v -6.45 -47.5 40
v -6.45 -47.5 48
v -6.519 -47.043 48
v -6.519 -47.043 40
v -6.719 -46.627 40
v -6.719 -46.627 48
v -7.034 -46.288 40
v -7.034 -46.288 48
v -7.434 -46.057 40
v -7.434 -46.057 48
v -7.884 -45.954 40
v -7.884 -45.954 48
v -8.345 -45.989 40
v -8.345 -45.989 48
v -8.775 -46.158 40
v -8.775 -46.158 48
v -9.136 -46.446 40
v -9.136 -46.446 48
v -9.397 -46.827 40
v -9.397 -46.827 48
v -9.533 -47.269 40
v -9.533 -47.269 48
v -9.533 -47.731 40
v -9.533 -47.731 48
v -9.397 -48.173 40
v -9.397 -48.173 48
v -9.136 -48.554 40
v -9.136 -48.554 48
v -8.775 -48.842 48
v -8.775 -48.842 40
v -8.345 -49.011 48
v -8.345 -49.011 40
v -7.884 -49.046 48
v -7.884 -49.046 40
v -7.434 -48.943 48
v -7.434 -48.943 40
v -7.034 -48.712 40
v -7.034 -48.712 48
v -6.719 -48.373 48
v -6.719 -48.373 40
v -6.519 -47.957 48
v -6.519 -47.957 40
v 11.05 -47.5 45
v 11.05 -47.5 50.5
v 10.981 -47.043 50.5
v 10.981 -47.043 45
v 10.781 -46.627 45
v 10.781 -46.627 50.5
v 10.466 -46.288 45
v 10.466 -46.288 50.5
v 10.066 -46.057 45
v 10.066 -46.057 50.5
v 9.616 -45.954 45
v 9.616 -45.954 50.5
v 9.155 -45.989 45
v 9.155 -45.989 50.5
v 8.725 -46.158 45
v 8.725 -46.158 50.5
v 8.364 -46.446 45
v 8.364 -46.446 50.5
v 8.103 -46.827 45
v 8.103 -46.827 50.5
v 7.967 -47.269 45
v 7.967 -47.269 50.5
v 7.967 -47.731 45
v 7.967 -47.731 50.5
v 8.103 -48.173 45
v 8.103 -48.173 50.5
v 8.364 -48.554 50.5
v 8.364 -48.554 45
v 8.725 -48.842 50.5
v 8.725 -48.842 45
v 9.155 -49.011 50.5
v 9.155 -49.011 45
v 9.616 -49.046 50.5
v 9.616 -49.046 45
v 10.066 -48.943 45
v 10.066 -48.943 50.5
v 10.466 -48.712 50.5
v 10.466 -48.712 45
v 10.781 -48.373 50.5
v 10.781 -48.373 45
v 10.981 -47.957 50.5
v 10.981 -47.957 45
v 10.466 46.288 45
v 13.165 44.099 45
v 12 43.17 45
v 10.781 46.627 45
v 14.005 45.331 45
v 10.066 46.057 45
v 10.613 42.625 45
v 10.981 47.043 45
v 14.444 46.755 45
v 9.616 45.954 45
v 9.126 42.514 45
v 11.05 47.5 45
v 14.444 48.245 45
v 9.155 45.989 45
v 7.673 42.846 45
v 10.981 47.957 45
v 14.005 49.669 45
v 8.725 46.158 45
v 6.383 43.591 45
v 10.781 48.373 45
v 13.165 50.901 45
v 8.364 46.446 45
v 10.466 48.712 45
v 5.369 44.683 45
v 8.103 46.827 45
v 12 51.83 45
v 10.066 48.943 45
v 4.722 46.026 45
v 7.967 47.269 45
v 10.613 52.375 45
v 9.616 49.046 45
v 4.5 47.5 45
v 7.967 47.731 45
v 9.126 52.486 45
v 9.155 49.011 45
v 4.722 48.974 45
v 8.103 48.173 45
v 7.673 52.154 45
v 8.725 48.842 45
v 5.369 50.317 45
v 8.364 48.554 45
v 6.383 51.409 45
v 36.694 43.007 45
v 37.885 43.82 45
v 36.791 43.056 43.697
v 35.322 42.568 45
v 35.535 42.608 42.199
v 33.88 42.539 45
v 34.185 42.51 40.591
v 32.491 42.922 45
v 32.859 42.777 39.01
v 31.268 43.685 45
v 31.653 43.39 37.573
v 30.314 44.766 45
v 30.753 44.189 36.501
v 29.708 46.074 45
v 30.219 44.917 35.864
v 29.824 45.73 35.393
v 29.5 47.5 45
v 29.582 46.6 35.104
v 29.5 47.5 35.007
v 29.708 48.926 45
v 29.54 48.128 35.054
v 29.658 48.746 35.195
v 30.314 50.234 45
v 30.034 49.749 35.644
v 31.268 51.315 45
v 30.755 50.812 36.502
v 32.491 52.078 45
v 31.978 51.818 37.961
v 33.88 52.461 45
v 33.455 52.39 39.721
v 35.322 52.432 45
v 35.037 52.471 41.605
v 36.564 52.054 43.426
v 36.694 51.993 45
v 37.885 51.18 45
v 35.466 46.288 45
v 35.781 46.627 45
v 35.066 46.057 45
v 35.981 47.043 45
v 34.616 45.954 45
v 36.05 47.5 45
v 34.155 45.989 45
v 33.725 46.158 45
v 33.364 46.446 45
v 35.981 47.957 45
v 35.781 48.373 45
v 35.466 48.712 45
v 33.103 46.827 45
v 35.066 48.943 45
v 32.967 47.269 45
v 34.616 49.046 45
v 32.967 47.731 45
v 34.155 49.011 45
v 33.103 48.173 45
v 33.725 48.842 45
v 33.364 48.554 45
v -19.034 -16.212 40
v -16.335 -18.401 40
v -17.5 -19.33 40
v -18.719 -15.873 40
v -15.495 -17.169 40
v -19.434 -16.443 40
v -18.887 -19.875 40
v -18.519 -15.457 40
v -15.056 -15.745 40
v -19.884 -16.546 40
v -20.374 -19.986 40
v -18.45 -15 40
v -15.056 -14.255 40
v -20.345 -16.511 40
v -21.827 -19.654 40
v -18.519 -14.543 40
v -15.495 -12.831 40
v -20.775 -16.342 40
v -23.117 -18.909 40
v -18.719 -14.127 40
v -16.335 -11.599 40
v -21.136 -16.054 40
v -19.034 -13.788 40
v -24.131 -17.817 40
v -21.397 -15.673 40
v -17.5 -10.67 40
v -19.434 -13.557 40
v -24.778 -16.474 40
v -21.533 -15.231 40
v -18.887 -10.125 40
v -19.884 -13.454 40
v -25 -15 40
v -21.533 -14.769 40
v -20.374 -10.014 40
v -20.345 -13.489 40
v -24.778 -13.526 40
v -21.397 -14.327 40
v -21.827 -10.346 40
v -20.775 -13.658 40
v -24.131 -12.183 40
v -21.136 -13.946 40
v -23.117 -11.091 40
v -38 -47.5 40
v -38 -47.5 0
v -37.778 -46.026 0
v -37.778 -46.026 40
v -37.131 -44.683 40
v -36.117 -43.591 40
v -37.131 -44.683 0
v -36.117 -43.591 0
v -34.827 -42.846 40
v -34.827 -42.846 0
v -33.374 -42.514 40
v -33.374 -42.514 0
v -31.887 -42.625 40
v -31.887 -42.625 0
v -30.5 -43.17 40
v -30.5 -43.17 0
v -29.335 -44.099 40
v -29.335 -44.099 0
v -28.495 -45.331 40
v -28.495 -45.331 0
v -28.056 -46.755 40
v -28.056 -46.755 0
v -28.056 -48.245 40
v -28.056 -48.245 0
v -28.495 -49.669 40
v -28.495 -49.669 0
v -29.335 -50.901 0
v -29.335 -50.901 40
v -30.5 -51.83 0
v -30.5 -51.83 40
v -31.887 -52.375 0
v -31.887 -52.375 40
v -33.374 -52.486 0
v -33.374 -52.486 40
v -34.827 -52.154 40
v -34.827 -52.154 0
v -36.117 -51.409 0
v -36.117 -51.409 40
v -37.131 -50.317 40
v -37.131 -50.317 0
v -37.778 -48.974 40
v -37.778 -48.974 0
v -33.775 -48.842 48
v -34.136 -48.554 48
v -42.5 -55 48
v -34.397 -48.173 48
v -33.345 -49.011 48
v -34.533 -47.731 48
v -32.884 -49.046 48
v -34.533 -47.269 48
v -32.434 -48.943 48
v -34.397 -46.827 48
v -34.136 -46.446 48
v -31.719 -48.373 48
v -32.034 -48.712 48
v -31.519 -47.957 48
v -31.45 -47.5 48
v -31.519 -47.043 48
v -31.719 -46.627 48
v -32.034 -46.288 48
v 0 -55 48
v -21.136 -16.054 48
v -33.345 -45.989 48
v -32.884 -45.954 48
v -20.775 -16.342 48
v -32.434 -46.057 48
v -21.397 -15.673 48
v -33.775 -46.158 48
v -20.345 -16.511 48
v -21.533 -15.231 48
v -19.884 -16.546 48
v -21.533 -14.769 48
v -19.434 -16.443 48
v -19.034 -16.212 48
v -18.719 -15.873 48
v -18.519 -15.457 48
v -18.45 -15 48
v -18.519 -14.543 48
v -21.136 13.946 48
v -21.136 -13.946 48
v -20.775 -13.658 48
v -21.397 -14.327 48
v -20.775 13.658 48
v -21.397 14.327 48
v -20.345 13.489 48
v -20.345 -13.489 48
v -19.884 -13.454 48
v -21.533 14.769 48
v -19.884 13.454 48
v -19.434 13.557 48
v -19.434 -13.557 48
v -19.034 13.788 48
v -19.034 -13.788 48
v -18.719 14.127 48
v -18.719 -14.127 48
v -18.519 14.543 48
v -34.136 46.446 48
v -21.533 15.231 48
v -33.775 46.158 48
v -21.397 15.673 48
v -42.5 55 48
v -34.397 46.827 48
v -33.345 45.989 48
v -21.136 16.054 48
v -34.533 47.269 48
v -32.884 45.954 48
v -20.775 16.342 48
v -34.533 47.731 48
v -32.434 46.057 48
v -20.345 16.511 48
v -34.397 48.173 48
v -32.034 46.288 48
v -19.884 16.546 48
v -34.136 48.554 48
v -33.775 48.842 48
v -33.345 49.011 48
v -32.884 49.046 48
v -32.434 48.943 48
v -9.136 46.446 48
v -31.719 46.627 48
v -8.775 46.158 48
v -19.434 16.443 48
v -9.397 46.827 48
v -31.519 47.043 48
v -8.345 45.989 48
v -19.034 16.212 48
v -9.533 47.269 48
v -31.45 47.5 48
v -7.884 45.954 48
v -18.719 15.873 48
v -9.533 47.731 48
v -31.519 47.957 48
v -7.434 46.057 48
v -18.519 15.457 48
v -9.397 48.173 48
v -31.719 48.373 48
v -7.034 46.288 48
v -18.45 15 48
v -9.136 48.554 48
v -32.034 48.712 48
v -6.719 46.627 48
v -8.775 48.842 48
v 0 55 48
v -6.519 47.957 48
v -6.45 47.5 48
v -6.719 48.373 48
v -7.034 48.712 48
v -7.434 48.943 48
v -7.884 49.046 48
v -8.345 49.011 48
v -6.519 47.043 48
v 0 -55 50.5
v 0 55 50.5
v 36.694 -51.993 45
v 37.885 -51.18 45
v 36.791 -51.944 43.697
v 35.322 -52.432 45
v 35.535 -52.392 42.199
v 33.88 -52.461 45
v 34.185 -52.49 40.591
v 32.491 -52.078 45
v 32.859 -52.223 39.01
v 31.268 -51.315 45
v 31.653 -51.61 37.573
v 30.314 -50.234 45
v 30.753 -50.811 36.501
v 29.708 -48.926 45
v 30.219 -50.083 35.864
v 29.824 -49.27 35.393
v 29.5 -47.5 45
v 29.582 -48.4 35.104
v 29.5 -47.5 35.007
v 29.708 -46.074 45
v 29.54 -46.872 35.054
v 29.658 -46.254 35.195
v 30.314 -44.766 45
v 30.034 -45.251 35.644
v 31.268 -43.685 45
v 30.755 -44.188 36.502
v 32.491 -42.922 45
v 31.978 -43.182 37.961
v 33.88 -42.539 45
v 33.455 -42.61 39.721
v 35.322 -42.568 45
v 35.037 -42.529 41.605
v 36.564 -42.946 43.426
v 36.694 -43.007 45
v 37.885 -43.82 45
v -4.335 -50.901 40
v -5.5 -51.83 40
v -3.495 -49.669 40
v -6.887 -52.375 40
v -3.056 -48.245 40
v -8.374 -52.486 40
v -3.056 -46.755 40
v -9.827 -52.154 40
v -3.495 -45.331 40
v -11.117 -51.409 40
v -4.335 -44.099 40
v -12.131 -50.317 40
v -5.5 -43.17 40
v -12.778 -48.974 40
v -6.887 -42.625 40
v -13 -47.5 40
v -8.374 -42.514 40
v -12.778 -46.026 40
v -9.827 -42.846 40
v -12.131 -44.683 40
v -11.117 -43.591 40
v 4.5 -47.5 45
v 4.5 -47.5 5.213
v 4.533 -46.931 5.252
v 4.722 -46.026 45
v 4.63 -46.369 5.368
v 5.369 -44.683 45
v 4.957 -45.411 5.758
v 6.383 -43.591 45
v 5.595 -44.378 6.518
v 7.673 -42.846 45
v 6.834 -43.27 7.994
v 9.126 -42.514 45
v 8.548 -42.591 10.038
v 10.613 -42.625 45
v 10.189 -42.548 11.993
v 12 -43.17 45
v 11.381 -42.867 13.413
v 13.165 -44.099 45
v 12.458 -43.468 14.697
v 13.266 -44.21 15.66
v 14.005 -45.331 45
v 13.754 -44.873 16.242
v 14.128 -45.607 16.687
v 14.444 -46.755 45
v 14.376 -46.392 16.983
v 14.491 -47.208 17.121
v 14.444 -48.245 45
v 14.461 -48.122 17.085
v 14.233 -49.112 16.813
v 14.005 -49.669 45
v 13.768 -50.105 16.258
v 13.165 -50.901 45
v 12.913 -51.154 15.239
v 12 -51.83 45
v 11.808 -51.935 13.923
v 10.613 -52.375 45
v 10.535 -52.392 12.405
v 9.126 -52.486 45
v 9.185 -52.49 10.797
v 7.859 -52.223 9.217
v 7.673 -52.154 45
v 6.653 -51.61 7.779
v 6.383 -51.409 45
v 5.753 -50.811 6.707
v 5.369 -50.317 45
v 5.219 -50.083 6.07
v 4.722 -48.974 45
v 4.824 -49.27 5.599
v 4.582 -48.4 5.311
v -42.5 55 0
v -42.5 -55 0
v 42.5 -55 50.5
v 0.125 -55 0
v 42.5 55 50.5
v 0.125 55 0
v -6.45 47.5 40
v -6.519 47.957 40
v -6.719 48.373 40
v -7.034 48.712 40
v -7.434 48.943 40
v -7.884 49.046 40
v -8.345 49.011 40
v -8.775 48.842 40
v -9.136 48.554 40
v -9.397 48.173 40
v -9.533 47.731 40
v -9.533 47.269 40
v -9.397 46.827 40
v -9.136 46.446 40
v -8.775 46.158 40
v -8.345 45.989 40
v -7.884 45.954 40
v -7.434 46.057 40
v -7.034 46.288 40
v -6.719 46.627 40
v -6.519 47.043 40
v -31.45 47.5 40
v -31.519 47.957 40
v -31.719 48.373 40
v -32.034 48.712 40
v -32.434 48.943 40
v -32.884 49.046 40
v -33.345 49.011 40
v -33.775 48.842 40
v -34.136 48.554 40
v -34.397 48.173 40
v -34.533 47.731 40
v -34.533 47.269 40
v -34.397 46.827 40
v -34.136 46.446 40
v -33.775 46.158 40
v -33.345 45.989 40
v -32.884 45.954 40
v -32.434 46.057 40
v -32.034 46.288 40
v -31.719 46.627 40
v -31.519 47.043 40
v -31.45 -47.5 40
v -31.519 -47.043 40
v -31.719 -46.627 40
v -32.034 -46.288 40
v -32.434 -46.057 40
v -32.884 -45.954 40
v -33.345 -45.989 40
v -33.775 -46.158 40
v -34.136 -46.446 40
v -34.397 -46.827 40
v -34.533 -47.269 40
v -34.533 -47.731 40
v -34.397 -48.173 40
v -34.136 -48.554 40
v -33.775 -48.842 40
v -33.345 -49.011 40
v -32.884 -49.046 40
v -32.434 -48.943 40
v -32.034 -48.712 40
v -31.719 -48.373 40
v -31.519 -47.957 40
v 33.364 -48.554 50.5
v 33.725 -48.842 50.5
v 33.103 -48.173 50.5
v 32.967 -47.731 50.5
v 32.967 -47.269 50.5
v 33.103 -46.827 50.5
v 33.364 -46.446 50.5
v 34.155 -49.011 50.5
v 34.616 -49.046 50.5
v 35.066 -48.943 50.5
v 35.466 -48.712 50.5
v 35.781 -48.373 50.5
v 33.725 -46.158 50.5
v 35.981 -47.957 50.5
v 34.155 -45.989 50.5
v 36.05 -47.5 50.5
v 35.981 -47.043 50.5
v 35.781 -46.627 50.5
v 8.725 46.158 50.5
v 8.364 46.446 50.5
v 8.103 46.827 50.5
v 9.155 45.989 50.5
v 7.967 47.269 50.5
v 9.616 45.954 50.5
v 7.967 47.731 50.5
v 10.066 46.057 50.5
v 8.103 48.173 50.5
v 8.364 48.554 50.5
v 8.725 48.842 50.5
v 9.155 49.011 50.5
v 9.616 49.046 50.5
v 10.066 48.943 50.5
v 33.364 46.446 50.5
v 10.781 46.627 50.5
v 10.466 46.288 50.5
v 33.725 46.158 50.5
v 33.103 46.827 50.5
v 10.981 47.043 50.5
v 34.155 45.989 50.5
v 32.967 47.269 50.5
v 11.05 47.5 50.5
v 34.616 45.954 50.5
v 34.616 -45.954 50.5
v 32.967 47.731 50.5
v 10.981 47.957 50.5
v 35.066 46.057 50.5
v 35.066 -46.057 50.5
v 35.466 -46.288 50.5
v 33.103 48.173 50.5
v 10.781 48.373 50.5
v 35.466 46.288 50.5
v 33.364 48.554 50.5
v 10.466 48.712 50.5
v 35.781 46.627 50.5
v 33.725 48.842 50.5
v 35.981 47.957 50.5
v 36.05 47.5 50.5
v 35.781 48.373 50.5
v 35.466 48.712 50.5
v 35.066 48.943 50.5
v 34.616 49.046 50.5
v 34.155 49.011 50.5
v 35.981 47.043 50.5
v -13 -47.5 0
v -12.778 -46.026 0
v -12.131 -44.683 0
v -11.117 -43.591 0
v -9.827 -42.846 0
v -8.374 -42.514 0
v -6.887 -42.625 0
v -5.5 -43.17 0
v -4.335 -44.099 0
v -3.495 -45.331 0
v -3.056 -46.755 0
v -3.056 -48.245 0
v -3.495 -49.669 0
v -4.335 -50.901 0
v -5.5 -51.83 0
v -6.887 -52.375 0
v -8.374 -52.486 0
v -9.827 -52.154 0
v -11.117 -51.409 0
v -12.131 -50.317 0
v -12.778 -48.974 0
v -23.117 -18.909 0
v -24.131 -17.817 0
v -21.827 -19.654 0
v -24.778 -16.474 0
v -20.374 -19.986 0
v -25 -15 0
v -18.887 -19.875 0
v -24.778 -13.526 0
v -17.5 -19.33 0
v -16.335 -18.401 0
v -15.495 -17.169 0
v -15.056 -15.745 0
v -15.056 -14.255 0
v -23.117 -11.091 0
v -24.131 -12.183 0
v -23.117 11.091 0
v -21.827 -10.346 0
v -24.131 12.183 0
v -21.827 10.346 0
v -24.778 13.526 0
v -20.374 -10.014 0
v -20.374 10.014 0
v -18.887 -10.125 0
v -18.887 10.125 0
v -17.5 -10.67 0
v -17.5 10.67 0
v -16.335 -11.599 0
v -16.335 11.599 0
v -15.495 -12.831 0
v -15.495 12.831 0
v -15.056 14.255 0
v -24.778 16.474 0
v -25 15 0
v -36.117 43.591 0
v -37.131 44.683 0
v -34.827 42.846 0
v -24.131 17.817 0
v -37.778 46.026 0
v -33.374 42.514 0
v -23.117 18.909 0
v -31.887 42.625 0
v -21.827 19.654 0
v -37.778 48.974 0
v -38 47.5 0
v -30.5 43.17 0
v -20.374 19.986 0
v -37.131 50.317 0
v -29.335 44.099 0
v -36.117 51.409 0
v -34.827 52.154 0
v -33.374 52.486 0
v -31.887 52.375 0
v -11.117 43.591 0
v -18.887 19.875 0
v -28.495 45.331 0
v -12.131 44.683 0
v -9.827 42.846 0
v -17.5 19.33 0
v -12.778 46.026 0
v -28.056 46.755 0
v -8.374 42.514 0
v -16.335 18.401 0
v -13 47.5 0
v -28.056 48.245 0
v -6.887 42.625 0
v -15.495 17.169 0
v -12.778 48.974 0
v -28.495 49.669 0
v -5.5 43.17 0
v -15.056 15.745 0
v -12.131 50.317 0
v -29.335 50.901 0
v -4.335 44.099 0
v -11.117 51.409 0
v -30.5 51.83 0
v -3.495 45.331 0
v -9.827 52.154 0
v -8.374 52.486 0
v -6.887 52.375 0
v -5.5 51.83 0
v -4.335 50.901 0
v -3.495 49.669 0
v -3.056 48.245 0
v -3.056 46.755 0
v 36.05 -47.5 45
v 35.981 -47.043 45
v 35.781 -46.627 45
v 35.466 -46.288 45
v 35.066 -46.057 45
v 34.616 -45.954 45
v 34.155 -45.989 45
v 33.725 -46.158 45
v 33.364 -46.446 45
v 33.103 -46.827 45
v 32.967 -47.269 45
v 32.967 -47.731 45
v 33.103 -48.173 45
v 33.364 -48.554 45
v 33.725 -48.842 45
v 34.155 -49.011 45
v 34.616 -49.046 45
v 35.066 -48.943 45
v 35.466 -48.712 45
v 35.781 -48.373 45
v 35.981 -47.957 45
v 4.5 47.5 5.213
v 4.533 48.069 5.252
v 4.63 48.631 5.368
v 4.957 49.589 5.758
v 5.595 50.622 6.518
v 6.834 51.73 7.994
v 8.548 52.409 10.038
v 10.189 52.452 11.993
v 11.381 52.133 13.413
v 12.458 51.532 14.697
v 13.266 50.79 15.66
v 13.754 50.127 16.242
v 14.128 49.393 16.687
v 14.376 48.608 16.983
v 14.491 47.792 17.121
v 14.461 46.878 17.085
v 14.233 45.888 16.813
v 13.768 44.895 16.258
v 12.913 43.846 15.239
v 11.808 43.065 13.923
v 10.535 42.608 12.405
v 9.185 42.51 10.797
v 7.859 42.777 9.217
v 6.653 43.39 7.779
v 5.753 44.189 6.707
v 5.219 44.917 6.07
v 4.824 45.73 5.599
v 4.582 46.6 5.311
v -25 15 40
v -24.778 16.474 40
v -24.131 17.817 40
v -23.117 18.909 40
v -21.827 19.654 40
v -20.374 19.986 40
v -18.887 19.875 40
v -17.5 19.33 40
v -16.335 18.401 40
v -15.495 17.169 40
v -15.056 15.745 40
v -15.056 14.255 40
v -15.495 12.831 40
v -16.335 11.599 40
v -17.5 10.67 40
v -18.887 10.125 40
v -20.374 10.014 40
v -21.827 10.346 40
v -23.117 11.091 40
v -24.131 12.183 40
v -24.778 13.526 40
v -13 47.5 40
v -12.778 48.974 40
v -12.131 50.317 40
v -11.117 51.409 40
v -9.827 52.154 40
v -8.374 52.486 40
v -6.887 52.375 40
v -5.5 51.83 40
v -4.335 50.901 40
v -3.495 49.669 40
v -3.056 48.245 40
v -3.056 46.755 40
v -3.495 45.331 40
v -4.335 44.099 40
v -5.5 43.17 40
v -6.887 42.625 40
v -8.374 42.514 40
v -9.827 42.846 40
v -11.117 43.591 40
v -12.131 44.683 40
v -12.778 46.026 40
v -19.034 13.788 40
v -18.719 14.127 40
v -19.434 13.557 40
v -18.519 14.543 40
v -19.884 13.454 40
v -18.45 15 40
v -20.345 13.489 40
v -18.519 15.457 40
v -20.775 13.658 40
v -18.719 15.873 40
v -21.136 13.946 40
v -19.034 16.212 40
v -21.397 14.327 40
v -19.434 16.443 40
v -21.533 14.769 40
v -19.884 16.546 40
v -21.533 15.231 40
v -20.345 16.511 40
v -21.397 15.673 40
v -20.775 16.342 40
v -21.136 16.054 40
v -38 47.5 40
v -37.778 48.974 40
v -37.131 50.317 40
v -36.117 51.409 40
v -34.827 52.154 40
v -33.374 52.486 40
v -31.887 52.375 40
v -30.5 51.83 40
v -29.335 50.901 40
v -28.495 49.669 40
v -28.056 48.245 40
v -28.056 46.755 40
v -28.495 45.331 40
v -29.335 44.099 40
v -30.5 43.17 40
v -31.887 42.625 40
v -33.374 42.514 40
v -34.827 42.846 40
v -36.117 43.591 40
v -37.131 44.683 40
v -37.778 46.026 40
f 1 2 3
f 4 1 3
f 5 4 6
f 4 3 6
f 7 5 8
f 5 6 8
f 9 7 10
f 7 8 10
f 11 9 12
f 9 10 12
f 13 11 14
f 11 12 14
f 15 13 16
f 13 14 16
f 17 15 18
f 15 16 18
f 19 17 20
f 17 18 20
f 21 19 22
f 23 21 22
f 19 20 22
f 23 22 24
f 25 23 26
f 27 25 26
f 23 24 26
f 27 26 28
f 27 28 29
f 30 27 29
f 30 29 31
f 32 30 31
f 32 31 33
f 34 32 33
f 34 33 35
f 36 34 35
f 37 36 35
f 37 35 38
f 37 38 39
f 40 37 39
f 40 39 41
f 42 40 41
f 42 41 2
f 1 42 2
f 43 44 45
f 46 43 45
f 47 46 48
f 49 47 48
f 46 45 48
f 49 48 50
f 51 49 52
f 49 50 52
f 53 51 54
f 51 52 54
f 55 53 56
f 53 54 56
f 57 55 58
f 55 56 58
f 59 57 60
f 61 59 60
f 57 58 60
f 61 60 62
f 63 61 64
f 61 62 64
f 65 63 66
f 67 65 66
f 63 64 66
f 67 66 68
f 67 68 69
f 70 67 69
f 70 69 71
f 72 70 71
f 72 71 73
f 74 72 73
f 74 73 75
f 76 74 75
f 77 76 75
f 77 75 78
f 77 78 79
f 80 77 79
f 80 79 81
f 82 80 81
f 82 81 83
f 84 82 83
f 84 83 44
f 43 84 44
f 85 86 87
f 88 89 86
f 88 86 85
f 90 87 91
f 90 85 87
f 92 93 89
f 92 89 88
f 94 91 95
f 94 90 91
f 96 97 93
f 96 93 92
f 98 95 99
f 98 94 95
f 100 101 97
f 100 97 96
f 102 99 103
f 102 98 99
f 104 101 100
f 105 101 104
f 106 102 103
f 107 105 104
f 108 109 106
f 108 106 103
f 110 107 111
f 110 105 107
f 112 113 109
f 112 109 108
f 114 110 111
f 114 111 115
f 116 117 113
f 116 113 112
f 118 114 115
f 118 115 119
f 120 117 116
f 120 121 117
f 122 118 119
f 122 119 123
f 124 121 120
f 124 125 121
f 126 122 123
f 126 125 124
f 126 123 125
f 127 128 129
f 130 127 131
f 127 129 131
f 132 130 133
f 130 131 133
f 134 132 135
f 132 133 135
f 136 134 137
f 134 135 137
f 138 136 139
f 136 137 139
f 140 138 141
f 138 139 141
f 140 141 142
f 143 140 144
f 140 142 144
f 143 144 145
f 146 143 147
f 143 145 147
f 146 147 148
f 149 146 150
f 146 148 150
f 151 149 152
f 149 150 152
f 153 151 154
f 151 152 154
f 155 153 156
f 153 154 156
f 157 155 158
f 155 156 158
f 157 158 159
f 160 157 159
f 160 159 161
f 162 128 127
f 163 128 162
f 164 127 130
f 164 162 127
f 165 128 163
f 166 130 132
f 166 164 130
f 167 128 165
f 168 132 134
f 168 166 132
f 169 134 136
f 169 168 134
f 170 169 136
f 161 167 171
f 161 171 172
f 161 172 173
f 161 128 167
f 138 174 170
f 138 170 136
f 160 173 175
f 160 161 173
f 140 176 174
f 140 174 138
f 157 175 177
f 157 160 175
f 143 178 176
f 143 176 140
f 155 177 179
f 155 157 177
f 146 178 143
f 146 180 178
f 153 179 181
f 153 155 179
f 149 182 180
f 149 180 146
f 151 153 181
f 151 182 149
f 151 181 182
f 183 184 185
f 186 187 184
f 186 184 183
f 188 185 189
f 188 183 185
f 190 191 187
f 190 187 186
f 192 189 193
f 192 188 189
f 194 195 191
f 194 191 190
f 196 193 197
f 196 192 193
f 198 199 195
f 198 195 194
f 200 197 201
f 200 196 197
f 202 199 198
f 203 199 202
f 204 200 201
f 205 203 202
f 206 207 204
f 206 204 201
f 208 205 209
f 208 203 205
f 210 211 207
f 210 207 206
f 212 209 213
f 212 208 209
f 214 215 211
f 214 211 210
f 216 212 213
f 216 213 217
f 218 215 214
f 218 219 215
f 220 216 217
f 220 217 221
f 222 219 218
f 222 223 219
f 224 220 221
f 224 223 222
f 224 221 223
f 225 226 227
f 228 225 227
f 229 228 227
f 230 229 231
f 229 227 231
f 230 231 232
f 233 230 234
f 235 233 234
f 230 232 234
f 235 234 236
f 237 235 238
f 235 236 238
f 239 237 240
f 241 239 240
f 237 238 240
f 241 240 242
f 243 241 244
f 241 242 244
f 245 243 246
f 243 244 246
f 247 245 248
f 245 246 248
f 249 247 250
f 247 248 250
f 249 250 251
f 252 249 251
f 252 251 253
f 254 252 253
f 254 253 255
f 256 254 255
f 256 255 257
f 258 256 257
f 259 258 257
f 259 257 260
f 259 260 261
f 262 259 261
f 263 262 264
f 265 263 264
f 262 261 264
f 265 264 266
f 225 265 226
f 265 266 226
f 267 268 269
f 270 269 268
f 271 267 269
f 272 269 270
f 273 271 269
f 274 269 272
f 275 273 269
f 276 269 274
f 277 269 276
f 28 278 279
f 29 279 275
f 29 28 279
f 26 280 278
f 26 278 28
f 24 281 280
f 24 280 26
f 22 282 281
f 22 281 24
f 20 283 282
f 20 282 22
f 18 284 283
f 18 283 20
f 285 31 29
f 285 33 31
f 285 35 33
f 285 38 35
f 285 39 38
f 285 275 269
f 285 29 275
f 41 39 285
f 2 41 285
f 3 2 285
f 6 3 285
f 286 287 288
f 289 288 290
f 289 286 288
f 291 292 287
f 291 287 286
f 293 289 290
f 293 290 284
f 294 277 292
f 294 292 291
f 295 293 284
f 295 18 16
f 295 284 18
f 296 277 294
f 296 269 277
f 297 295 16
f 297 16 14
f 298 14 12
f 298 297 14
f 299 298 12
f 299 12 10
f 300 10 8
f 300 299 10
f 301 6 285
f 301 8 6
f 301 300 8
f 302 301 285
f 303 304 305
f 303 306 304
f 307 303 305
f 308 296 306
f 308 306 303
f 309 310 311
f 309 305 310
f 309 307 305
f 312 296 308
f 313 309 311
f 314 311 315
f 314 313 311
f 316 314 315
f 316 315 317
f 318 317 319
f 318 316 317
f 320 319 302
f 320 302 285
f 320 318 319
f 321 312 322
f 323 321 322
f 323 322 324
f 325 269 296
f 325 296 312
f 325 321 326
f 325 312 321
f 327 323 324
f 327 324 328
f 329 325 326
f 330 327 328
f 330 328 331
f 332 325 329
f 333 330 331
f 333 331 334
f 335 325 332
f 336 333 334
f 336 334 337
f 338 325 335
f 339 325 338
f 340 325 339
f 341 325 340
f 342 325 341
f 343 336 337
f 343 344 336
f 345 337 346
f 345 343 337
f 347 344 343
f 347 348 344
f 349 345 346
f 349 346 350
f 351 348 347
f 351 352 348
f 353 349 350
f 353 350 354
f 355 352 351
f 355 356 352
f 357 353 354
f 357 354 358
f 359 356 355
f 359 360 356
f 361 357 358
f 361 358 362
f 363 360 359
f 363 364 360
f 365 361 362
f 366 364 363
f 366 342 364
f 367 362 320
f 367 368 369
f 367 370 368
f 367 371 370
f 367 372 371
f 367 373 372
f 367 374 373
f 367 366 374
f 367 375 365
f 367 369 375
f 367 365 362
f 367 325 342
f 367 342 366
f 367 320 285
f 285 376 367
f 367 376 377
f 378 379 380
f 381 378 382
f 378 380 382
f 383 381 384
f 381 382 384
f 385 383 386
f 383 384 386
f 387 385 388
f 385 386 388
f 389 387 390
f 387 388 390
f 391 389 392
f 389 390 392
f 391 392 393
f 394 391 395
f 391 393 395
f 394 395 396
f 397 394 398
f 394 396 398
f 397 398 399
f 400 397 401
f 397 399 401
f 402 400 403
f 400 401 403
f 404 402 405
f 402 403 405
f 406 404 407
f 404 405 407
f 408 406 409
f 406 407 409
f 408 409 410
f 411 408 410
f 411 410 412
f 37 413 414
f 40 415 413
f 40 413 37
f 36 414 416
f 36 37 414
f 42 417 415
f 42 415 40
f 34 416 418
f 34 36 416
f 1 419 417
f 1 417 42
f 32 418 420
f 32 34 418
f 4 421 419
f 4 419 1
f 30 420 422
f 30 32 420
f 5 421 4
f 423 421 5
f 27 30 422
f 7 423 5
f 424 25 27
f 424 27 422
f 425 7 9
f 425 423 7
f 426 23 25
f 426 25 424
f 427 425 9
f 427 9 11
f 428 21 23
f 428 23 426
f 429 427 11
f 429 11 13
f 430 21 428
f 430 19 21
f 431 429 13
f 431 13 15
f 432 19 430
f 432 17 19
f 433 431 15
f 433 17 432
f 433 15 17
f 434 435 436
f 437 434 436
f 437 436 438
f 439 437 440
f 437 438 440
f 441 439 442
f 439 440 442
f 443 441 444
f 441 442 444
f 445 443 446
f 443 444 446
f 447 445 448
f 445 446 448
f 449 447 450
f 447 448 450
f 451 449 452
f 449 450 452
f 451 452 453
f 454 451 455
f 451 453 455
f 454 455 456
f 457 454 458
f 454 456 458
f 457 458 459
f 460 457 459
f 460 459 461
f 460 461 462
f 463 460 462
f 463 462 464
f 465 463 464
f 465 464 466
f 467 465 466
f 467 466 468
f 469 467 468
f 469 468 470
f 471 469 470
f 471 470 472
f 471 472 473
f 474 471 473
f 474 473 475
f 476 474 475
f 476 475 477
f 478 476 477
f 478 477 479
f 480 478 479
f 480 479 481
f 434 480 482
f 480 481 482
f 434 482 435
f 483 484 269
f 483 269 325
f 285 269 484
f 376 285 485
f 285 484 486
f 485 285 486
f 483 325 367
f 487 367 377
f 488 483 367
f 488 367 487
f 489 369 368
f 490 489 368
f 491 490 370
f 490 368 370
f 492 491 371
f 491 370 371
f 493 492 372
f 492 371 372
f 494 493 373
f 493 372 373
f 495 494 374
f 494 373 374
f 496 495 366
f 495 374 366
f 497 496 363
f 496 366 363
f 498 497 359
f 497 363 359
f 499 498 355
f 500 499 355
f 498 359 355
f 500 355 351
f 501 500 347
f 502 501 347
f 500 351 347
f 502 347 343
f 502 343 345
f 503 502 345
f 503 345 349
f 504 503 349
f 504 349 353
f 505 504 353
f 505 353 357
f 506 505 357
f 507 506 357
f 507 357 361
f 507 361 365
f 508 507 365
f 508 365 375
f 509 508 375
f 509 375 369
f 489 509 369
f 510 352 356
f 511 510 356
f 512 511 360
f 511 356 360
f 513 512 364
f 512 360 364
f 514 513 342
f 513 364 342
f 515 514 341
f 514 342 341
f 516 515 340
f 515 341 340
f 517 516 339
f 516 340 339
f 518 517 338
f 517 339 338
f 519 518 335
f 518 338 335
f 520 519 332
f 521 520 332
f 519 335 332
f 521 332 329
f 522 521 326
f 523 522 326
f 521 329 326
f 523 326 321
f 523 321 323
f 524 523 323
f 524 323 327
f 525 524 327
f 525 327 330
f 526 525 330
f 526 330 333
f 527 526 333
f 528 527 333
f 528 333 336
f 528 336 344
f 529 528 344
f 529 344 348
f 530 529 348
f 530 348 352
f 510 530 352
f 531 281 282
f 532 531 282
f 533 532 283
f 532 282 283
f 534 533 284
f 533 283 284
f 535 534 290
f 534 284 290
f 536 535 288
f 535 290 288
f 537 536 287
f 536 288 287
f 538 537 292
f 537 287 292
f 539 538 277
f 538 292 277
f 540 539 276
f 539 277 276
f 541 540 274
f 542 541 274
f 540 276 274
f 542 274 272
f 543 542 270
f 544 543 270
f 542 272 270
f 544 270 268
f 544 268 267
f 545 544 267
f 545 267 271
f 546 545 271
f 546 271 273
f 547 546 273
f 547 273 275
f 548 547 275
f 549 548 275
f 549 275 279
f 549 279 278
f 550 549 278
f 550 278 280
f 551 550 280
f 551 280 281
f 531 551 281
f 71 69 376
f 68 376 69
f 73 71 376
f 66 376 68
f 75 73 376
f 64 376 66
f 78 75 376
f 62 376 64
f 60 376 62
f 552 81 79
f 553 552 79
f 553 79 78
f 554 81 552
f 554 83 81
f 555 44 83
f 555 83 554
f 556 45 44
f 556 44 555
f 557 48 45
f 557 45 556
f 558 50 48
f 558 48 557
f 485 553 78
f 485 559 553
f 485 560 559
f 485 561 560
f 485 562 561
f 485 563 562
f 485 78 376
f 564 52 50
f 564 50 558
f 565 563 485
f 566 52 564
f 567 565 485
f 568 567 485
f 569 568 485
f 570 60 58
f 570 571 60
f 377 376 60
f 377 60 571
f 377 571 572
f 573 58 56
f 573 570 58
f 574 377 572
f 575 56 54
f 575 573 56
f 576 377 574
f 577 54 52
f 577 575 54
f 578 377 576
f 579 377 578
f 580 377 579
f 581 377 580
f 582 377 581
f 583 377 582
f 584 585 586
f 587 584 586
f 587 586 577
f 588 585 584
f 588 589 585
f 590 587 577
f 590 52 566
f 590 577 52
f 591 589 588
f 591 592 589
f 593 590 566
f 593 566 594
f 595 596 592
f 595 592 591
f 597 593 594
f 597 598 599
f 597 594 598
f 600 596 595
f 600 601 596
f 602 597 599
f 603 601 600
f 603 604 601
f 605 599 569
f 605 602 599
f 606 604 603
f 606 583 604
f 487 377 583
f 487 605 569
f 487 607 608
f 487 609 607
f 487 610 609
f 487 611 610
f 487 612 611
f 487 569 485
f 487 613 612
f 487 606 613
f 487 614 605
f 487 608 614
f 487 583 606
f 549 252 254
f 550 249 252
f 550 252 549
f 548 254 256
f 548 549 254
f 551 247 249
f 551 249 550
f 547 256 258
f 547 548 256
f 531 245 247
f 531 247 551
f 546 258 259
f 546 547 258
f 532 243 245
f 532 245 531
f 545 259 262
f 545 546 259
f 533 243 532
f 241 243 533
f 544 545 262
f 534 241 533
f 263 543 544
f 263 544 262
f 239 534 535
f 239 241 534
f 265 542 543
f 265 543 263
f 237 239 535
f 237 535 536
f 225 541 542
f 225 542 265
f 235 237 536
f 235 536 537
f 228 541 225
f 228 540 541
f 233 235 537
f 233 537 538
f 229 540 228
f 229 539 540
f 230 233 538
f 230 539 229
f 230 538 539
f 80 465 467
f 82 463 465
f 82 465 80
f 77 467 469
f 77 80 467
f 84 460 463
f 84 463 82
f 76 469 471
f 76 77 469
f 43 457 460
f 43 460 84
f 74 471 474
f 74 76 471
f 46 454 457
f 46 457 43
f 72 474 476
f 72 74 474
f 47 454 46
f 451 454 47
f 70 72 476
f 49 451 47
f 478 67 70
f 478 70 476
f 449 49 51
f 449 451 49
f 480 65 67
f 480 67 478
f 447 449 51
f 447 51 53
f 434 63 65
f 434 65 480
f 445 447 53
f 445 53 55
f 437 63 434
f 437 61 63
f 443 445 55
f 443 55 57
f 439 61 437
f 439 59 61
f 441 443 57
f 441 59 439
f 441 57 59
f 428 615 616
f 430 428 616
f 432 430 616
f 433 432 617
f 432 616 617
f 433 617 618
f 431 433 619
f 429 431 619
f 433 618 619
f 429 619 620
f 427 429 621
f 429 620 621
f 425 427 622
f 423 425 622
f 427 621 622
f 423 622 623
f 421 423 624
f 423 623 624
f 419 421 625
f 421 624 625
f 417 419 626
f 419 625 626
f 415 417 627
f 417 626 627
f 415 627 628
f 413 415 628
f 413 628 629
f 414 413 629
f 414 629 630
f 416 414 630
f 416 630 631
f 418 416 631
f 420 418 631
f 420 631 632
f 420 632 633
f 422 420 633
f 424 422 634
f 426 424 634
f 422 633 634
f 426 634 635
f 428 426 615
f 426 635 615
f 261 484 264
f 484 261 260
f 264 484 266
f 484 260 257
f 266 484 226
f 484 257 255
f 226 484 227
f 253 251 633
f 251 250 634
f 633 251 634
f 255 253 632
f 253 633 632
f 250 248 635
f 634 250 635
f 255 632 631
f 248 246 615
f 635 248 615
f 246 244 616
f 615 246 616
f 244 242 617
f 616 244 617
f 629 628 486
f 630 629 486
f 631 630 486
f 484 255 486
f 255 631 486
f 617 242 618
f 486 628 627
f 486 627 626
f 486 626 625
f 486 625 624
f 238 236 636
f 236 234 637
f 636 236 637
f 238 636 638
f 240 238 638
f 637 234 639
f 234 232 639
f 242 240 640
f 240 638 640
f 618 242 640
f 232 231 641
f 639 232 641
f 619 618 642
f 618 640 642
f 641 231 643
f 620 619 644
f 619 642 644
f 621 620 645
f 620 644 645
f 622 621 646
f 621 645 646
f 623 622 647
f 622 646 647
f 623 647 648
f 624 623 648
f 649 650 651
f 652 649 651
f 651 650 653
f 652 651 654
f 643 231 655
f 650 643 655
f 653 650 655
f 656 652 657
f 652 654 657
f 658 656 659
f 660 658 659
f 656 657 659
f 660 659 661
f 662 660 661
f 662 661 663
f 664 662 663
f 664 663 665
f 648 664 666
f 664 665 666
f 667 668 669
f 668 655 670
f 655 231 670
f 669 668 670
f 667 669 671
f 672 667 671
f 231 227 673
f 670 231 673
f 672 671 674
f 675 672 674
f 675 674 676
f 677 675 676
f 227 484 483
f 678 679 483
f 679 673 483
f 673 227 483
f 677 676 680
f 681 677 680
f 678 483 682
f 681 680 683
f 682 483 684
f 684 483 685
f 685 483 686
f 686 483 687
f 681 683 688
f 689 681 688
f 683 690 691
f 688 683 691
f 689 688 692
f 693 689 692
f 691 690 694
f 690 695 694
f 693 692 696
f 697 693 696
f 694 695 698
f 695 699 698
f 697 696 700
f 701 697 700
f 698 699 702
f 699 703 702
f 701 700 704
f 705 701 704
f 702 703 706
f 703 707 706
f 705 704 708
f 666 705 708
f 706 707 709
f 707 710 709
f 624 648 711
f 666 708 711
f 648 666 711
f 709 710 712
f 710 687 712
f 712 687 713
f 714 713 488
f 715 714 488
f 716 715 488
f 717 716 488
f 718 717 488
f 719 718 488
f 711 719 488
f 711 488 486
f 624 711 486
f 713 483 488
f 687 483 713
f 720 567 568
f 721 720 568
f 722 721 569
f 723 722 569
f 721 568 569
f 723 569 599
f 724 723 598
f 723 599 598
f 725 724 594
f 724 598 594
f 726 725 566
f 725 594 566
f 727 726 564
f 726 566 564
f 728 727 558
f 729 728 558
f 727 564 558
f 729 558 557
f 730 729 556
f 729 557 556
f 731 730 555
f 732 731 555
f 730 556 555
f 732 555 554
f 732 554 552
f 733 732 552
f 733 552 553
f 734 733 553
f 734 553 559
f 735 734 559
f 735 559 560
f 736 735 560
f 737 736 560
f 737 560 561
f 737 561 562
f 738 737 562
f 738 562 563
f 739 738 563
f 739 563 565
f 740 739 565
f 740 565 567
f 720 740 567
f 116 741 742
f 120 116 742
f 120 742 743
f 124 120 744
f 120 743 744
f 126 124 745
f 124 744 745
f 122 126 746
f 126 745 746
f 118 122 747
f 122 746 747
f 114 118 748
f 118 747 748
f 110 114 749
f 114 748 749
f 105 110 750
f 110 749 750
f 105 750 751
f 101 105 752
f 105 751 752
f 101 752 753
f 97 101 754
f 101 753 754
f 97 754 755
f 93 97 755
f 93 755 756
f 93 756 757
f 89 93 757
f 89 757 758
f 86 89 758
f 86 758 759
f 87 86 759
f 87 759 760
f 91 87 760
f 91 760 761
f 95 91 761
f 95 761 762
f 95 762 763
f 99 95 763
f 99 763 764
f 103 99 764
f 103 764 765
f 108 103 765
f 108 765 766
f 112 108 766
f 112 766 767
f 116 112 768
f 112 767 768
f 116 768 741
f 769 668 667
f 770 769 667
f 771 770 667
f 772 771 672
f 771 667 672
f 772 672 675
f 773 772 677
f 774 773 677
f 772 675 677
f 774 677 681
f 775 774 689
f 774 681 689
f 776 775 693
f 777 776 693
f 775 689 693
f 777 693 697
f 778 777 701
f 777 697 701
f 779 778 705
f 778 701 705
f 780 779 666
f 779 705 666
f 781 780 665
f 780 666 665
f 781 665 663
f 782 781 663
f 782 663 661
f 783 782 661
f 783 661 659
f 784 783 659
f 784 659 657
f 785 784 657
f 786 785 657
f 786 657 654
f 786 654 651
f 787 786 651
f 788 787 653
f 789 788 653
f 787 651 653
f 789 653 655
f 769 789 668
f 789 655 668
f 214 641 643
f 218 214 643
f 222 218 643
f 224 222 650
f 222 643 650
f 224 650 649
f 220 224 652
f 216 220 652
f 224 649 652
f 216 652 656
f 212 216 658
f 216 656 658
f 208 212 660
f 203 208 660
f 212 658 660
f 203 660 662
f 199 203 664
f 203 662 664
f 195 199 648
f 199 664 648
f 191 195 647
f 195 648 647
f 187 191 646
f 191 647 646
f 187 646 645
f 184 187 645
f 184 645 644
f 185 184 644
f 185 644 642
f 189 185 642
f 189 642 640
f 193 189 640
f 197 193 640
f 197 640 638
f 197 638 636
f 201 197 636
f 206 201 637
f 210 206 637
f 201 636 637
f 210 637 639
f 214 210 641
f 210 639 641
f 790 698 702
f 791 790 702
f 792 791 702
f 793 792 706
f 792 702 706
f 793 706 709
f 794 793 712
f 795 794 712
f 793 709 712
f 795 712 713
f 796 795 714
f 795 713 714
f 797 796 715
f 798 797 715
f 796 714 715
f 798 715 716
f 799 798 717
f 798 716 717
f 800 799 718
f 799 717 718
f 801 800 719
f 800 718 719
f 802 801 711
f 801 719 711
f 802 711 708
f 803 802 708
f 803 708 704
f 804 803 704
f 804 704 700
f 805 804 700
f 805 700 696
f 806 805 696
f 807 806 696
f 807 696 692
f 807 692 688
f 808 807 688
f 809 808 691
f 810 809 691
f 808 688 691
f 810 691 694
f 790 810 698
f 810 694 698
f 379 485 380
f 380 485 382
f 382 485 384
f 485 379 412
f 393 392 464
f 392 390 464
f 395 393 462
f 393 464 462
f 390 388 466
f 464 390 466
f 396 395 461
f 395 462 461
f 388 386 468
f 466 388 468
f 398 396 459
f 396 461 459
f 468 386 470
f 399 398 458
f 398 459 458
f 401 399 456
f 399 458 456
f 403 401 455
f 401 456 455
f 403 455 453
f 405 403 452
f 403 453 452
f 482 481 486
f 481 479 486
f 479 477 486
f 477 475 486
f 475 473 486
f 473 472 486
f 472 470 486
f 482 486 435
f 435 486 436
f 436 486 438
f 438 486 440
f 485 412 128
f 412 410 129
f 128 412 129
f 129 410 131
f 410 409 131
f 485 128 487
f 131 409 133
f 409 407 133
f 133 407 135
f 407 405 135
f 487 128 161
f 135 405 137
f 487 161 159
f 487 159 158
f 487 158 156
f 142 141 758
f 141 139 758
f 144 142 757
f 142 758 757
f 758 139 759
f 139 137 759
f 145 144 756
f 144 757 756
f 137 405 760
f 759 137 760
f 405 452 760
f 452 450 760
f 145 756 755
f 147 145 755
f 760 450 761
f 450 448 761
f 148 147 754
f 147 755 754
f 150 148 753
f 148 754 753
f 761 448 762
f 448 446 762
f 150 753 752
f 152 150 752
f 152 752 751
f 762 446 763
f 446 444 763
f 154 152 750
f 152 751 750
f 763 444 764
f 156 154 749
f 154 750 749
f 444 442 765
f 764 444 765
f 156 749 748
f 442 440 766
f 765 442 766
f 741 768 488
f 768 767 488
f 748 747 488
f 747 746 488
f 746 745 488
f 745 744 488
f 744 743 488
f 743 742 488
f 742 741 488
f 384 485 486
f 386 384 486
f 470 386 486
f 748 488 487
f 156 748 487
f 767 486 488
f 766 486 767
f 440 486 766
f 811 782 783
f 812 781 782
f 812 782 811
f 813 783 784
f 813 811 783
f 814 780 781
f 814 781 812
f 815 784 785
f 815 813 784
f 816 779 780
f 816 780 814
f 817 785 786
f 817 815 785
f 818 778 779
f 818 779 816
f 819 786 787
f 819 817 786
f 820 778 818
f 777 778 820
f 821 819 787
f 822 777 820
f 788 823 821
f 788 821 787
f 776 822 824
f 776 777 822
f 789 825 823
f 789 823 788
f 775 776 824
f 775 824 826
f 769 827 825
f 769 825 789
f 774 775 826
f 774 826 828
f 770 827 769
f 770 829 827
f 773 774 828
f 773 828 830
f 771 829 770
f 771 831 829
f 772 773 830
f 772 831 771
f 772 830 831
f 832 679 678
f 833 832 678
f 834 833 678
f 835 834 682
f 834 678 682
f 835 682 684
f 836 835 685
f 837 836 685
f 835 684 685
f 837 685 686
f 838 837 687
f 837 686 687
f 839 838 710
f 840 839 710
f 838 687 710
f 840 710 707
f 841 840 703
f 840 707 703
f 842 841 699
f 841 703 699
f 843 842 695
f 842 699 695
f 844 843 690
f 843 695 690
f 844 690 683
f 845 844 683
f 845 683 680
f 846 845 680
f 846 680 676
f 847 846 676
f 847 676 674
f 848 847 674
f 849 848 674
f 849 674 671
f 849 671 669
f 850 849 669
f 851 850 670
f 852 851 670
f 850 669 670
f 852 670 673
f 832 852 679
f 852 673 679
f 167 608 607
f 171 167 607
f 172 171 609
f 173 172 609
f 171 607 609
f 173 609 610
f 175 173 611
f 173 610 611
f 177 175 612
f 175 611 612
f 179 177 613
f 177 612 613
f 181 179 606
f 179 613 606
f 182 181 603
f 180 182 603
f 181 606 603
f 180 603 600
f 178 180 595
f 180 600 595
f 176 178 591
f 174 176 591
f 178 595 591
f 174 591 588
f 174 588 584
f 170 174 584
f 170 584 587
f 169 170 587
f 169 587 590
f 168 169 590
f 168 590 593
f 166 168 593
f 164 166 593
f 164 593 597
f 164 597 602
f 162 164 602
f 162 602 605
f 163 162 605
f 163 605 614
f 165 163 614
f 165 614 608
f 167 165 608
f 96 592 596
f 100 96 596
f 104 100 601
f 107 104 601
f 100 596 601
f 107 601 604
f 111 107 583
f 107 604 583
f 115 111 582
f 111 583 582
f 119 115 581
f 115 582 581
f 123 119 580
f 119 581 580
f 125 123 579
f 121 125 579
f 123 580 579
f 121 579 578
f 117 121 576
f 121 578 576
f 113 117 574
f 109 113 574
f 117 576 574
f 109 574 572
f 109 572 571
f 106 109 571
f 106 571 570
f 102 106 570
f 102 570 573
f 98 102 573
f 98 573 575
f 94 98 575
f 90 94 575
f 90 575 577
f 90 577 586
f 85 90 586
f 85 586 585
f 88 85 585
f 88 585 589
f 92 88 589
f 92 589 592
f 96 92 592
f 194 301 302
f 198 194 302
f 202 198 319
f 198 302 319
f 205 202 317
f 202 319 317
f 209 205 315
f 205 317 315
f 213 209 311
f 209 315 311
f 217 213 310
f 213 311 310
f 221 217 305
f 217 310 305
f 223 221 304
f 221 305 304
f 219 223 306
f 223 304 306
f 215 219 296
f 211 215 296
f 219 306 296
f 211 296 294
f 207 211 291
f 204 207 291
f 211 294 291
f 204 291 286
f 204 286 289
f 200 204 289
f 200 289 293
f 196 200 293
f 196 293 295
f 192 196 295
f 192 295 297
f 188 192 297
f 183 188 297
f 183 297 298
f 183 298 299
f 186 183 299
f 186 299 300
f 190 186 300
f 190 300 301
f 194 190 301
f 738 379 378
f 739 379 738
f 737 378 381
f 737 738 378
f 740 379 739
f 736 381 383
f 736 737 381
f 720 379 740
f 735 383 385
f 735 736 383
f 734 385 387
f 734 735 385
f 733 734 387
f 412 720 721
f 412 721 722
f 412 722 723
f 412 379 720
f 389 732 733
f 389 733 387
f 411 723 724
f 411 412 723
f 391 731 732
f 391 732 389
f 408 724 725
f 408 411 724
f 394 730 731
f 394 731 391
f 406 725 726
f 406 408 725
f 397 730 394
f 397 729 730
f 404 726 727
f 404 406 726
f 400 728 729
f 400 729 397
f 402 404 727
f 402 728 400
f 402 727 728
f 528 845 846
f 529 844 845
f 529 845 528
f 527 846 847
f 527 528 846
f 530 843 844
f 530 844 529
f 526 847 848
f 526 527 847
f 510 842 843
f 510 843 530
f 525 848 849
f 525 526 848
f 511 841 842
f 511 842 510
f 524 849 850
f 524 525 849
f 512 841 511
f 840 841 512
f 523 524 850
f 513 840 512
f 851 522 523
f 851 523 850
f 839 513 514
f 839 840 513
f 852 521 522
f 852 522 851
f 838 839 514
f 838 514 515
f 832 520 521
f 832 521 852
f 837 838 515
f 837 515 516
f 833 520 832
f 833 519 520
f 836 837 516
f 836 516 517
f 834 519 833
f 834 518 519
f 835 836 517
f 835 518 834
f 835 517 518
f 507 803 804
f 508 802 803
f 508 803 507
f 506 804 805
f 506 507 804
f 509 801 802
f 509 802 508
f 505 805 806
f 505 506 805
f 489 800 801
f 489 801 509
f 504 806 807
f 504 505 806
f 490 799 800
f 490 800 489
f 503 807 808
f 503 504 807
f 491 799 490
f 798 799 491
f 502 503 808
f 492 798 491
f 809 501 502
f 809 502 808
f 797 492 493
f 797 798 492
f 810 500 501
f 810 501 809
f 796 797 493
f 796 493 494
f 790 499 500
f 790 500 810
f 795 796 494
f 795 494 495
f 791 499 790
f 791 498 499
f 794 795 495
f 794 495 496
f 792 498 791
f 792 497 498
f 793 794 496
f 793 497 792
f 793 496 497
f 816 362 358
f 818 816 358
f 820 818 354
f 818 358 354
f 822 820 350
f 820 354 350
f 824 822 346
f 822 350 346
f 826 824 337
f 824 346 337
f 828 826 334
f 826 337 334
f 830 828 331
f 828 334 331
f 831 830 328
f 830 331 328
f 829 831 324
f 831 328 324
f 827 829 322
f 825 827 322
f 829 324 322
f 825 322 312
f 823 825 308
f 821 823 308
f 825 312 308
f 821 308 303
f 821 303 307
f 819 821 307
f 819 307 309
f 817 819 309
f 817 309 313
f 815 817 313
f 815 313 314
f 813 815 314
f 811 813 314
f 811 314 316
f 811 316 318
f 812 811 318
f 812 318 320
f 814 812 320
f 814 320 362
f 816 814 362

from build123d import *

# Parameters (mm, degrees)
SKETCH1_W           = 85
SKETCH1_H           = 110
BOSS_EXTRUDE1_DEPTH = 50.5
SKETCH2_W           = 42.5
SKETCH2_H           = 110
CUT_EXTRUDE1_DEPTH  = 2.5
CUT_EXTRUDE2_REACH  = 87.988
SKETCH3_W           = 130
SKETCH3_H           = 130
CUT_EXTRUDE3_REACH  = 86.47
SKETCH4_R           = 1.55
SKETCH5_R           = 1.55
CUT_EXTRUDE5_DEPTH  = 86.915656315
SKETCH9_R           = 5
CUT_EXTRUDE6_DEPTH  = 55
SKETCH10_R          = 5
CUT_EXTRUDE7_DEPTH  = 40


with BuildPart() as part:
    # Sketch1 → Boss-Extrude1 (new body)
    with BuildSketch(Plane.XY):
        Rectangle(SKETCH1_W, SKETCH1_H)
    extrude(amount=BOSS_EXTRUDE1_DEPTH)

    # Sketch2 → Cut-Extrude1 (cut)
    with BuildSketch(Plane.XY.offset(50.5)):
        with Locations((-21.25, 0)):
            Rectangle(SKETCH2_W, SKETCH2_H)
    extrude(amount=-CUT_EXTRUDE1_DEPTH, mode=Mode.SUBTRACT)

    # Sketch3 → Cut-Extrude2 (cut, up to next)
    with BuildSketch(Plane(origin=(0.073628012, 0, -0.061781238), x_dir=(0, 1, 0), z_dir=(-0.7660444431189792, 0, 0.6427876096865379)), mode=Mode.PRIVATE) as cut_extrude2_sk1:
        with Locations((-1.816321809, -4.4988995)):
            Rectangle(SKETCH3_W, SKETCH3_H)
    cut_extrude2_tool1 = extrude(cut_extrude2_sk1.sketch, amount=-CUT_EXTRUDE2_REACH, mode=Mode.PRIVATE) & part.part
    add(cut_extrude2_tool1.solids().sort_by_distance((2.965465, -1.816322, 3.384576))[0], mode=Mode.SUBTRACT)

    # Sketch4 → Cut-Extrude3 (cut, up to next)
    with BuildSketch(Plane.XY.offset(48), mode=Mode.PRIVATE) as cut_extrude3_sk1:
        with Locations((-8, 47.5)):
            Circle(SKETCH4_R)
    cut_extrude3_tool1 = extrude(cut_extrude3_sk1.sketch, amount=-CUT_EXTRUDE3_REACH, mode=Mode.PRIVATE) & part.part
    # Sketch4 → Cut-Extrude3 (cut, up to next)
    with BuildSketch(Plane.XY.offset(48), mode=Mode.PRIVATE) as cut_extrude3_sk2:
        with Locations((-33, 47.5)):
            Circle(SKETCH4_R)
    cut_extrude3_tool2 = extrude(cut_extrude3_sk2.sketch, amount=-CUT_EXTRUDE3_REACH, mode=Mode.PRIVATE) & part.part
    # Sketch4 → Cut-Extrude3 (cut, up to next)
    with BuildSketch(Plane.XY.offset(48), mode=Mode.PRIVATE) as cut_extrude3_sk3:
        with Locations((-20, 15)):
            Circle(SKETCH4_R)
    cut_extrude3_tool3 = extrude(cut_extrude3_sk3.sketch, amount=-CUT_EXTRUDE3_REACH, mode=Mode.PRIVATE) & part.part
    # Sketch4 → Cut-Extrude3 (cut, up to next)
    with BuildSketch(Plane.XY.offset(48), mode=Mode.PRIVATE) as cut_extrude3_sk4:
        with Locations((-20, -15)):
            Circle(SKETCH4_R)
    cut_extrude3_tool4 = extrude(cut_extrude3_sk4.sketch, amount=-CUT_EXTRUDE3_REACH, mode=Mode.PRIVATE) & part.part
    # Sketch4 → Cut-Extrude3 (cut, up to next)
    with BuildSketch(Plane.XY.offset(48), mode=Mode.PRIVATE) as cut_extrude3_sk5:
        with Locations((-8, -47.5)):
            Circle(SKETCH4_R)
    cut_extrude3_tool5 = extrude(cut_extrude3_sk5.sketch, amount=-CUT_EXTRUDE3_REACH, mode=Mode.PRIVATE) & part.part
    # Sketch4 → Cut-Extrude3 (cut, up to next)
    with BuildSketch(Plane.XY.offset(48), mode=Mode.PRIVATE) as cut_extrude3_sk6:
        with Locations((-33, -47.5)):
            Circle(SKETCH4_R)
    cut_extrude3_tool6 = extrude(cut_extrude3_sk6.sketch, amount=-CUT_EXTRUDE3_REACH, mode=Mode.PRIVATE) & part.part
    add(cut_extrude3_tool1.solids().sort_by_distance((-8, 47.5, 48))[0], mode=Mode.SUBTRACT)
    add(cut_extrude3_tool2.solids().sort_by_distance((-33, 47.5, 48))[0], mode=Mode.SUBTRACT)
    add(cut_extrude3_tool3.solids().sort_by_distance((-20, 15, 48))[0], mode=Mode.SUBTRACT)
    add(cut_extrude3_tool4.solids().sort_by_distance((-20, -15, 48))[0], mode=Mode.SUBTRACT)
    add(cut_extrude3_tool5.solids().sort_by_distance((-8, -47.5, 48))[0], mode=Mode.SUBTRACT)
    add(cut_extrude3_tool6.solids().sort_by_distance((-33, -47.5, 48))[0], mode=Mode.SUBTRACT)

    # Sketch5 → Cut-Extrude5 (cut, through all)
    with BuildSketch(Plane.XY.offset(50.5)):
        with Locations((9.5, 47.5)):
            Circle(SKETCH5_R)
        with Locations((34.5, 47.5)):
            Circle(SKETCH5_R)
        with Locations((34.5, -47.5)):
            Circle(SKETCH5_R)
        with Locations((9.5, -47.5)):
            Circle(SKETCH5_R)
    extrude(amount=-CUT_EXTRUDE5_DEPTH, mode=Mode.SUBTRACT)

    # Sketch9 → Cut-Extrude6 (cut)
    with BuildSketch(Plane(origin=(0, 0, -10), x_dir=(-1, 0, 0), z_dir=(0, 0, -1))):
        with Locations((-34.5, 47.5)):
            Circle(SKETCH9_R)
        with Locations((-9.5, 47.5)):
            Circle(SKETCH9_R)
        with Locations((-34.5, -47.5)):
            Circle(SKETCH9_R)
        with Locations((-9.5, -47.5)):
            Circle(SKETCH9_R)
    extrude(amount=-CUT_EXTRUDE6_DEPTH, mode=Mode.SUBTRACT)

    # Sketch10 → Cut-Extrude7 (cut)
    with BuildSketch(Plane(origin=(0, 0, 0), x_dir=(-1, 0, 0), z_dir=(0, 0, -1))):
        with Locations((8, 47.5)):
            Circle(SKETCH10_R)
        with Locations((33, 47.5)):
            Circle(SKETCH10_R)
        with Locations((33, -47.5)):
            Circle(SKETCH10_R)
        with Locations((8, -47.5)):
            Circle(SKETCH10_R)
        with Locations((20, 15)):
            Circle(SKETCH10_R)
        with Locations((20, -15)):
            Circle(SKETCH10_R)
    extrude(amount=-CUT_EXTRUDE7_DEPTH, mode=Mode.SUBTRACT)


solid = part.part
